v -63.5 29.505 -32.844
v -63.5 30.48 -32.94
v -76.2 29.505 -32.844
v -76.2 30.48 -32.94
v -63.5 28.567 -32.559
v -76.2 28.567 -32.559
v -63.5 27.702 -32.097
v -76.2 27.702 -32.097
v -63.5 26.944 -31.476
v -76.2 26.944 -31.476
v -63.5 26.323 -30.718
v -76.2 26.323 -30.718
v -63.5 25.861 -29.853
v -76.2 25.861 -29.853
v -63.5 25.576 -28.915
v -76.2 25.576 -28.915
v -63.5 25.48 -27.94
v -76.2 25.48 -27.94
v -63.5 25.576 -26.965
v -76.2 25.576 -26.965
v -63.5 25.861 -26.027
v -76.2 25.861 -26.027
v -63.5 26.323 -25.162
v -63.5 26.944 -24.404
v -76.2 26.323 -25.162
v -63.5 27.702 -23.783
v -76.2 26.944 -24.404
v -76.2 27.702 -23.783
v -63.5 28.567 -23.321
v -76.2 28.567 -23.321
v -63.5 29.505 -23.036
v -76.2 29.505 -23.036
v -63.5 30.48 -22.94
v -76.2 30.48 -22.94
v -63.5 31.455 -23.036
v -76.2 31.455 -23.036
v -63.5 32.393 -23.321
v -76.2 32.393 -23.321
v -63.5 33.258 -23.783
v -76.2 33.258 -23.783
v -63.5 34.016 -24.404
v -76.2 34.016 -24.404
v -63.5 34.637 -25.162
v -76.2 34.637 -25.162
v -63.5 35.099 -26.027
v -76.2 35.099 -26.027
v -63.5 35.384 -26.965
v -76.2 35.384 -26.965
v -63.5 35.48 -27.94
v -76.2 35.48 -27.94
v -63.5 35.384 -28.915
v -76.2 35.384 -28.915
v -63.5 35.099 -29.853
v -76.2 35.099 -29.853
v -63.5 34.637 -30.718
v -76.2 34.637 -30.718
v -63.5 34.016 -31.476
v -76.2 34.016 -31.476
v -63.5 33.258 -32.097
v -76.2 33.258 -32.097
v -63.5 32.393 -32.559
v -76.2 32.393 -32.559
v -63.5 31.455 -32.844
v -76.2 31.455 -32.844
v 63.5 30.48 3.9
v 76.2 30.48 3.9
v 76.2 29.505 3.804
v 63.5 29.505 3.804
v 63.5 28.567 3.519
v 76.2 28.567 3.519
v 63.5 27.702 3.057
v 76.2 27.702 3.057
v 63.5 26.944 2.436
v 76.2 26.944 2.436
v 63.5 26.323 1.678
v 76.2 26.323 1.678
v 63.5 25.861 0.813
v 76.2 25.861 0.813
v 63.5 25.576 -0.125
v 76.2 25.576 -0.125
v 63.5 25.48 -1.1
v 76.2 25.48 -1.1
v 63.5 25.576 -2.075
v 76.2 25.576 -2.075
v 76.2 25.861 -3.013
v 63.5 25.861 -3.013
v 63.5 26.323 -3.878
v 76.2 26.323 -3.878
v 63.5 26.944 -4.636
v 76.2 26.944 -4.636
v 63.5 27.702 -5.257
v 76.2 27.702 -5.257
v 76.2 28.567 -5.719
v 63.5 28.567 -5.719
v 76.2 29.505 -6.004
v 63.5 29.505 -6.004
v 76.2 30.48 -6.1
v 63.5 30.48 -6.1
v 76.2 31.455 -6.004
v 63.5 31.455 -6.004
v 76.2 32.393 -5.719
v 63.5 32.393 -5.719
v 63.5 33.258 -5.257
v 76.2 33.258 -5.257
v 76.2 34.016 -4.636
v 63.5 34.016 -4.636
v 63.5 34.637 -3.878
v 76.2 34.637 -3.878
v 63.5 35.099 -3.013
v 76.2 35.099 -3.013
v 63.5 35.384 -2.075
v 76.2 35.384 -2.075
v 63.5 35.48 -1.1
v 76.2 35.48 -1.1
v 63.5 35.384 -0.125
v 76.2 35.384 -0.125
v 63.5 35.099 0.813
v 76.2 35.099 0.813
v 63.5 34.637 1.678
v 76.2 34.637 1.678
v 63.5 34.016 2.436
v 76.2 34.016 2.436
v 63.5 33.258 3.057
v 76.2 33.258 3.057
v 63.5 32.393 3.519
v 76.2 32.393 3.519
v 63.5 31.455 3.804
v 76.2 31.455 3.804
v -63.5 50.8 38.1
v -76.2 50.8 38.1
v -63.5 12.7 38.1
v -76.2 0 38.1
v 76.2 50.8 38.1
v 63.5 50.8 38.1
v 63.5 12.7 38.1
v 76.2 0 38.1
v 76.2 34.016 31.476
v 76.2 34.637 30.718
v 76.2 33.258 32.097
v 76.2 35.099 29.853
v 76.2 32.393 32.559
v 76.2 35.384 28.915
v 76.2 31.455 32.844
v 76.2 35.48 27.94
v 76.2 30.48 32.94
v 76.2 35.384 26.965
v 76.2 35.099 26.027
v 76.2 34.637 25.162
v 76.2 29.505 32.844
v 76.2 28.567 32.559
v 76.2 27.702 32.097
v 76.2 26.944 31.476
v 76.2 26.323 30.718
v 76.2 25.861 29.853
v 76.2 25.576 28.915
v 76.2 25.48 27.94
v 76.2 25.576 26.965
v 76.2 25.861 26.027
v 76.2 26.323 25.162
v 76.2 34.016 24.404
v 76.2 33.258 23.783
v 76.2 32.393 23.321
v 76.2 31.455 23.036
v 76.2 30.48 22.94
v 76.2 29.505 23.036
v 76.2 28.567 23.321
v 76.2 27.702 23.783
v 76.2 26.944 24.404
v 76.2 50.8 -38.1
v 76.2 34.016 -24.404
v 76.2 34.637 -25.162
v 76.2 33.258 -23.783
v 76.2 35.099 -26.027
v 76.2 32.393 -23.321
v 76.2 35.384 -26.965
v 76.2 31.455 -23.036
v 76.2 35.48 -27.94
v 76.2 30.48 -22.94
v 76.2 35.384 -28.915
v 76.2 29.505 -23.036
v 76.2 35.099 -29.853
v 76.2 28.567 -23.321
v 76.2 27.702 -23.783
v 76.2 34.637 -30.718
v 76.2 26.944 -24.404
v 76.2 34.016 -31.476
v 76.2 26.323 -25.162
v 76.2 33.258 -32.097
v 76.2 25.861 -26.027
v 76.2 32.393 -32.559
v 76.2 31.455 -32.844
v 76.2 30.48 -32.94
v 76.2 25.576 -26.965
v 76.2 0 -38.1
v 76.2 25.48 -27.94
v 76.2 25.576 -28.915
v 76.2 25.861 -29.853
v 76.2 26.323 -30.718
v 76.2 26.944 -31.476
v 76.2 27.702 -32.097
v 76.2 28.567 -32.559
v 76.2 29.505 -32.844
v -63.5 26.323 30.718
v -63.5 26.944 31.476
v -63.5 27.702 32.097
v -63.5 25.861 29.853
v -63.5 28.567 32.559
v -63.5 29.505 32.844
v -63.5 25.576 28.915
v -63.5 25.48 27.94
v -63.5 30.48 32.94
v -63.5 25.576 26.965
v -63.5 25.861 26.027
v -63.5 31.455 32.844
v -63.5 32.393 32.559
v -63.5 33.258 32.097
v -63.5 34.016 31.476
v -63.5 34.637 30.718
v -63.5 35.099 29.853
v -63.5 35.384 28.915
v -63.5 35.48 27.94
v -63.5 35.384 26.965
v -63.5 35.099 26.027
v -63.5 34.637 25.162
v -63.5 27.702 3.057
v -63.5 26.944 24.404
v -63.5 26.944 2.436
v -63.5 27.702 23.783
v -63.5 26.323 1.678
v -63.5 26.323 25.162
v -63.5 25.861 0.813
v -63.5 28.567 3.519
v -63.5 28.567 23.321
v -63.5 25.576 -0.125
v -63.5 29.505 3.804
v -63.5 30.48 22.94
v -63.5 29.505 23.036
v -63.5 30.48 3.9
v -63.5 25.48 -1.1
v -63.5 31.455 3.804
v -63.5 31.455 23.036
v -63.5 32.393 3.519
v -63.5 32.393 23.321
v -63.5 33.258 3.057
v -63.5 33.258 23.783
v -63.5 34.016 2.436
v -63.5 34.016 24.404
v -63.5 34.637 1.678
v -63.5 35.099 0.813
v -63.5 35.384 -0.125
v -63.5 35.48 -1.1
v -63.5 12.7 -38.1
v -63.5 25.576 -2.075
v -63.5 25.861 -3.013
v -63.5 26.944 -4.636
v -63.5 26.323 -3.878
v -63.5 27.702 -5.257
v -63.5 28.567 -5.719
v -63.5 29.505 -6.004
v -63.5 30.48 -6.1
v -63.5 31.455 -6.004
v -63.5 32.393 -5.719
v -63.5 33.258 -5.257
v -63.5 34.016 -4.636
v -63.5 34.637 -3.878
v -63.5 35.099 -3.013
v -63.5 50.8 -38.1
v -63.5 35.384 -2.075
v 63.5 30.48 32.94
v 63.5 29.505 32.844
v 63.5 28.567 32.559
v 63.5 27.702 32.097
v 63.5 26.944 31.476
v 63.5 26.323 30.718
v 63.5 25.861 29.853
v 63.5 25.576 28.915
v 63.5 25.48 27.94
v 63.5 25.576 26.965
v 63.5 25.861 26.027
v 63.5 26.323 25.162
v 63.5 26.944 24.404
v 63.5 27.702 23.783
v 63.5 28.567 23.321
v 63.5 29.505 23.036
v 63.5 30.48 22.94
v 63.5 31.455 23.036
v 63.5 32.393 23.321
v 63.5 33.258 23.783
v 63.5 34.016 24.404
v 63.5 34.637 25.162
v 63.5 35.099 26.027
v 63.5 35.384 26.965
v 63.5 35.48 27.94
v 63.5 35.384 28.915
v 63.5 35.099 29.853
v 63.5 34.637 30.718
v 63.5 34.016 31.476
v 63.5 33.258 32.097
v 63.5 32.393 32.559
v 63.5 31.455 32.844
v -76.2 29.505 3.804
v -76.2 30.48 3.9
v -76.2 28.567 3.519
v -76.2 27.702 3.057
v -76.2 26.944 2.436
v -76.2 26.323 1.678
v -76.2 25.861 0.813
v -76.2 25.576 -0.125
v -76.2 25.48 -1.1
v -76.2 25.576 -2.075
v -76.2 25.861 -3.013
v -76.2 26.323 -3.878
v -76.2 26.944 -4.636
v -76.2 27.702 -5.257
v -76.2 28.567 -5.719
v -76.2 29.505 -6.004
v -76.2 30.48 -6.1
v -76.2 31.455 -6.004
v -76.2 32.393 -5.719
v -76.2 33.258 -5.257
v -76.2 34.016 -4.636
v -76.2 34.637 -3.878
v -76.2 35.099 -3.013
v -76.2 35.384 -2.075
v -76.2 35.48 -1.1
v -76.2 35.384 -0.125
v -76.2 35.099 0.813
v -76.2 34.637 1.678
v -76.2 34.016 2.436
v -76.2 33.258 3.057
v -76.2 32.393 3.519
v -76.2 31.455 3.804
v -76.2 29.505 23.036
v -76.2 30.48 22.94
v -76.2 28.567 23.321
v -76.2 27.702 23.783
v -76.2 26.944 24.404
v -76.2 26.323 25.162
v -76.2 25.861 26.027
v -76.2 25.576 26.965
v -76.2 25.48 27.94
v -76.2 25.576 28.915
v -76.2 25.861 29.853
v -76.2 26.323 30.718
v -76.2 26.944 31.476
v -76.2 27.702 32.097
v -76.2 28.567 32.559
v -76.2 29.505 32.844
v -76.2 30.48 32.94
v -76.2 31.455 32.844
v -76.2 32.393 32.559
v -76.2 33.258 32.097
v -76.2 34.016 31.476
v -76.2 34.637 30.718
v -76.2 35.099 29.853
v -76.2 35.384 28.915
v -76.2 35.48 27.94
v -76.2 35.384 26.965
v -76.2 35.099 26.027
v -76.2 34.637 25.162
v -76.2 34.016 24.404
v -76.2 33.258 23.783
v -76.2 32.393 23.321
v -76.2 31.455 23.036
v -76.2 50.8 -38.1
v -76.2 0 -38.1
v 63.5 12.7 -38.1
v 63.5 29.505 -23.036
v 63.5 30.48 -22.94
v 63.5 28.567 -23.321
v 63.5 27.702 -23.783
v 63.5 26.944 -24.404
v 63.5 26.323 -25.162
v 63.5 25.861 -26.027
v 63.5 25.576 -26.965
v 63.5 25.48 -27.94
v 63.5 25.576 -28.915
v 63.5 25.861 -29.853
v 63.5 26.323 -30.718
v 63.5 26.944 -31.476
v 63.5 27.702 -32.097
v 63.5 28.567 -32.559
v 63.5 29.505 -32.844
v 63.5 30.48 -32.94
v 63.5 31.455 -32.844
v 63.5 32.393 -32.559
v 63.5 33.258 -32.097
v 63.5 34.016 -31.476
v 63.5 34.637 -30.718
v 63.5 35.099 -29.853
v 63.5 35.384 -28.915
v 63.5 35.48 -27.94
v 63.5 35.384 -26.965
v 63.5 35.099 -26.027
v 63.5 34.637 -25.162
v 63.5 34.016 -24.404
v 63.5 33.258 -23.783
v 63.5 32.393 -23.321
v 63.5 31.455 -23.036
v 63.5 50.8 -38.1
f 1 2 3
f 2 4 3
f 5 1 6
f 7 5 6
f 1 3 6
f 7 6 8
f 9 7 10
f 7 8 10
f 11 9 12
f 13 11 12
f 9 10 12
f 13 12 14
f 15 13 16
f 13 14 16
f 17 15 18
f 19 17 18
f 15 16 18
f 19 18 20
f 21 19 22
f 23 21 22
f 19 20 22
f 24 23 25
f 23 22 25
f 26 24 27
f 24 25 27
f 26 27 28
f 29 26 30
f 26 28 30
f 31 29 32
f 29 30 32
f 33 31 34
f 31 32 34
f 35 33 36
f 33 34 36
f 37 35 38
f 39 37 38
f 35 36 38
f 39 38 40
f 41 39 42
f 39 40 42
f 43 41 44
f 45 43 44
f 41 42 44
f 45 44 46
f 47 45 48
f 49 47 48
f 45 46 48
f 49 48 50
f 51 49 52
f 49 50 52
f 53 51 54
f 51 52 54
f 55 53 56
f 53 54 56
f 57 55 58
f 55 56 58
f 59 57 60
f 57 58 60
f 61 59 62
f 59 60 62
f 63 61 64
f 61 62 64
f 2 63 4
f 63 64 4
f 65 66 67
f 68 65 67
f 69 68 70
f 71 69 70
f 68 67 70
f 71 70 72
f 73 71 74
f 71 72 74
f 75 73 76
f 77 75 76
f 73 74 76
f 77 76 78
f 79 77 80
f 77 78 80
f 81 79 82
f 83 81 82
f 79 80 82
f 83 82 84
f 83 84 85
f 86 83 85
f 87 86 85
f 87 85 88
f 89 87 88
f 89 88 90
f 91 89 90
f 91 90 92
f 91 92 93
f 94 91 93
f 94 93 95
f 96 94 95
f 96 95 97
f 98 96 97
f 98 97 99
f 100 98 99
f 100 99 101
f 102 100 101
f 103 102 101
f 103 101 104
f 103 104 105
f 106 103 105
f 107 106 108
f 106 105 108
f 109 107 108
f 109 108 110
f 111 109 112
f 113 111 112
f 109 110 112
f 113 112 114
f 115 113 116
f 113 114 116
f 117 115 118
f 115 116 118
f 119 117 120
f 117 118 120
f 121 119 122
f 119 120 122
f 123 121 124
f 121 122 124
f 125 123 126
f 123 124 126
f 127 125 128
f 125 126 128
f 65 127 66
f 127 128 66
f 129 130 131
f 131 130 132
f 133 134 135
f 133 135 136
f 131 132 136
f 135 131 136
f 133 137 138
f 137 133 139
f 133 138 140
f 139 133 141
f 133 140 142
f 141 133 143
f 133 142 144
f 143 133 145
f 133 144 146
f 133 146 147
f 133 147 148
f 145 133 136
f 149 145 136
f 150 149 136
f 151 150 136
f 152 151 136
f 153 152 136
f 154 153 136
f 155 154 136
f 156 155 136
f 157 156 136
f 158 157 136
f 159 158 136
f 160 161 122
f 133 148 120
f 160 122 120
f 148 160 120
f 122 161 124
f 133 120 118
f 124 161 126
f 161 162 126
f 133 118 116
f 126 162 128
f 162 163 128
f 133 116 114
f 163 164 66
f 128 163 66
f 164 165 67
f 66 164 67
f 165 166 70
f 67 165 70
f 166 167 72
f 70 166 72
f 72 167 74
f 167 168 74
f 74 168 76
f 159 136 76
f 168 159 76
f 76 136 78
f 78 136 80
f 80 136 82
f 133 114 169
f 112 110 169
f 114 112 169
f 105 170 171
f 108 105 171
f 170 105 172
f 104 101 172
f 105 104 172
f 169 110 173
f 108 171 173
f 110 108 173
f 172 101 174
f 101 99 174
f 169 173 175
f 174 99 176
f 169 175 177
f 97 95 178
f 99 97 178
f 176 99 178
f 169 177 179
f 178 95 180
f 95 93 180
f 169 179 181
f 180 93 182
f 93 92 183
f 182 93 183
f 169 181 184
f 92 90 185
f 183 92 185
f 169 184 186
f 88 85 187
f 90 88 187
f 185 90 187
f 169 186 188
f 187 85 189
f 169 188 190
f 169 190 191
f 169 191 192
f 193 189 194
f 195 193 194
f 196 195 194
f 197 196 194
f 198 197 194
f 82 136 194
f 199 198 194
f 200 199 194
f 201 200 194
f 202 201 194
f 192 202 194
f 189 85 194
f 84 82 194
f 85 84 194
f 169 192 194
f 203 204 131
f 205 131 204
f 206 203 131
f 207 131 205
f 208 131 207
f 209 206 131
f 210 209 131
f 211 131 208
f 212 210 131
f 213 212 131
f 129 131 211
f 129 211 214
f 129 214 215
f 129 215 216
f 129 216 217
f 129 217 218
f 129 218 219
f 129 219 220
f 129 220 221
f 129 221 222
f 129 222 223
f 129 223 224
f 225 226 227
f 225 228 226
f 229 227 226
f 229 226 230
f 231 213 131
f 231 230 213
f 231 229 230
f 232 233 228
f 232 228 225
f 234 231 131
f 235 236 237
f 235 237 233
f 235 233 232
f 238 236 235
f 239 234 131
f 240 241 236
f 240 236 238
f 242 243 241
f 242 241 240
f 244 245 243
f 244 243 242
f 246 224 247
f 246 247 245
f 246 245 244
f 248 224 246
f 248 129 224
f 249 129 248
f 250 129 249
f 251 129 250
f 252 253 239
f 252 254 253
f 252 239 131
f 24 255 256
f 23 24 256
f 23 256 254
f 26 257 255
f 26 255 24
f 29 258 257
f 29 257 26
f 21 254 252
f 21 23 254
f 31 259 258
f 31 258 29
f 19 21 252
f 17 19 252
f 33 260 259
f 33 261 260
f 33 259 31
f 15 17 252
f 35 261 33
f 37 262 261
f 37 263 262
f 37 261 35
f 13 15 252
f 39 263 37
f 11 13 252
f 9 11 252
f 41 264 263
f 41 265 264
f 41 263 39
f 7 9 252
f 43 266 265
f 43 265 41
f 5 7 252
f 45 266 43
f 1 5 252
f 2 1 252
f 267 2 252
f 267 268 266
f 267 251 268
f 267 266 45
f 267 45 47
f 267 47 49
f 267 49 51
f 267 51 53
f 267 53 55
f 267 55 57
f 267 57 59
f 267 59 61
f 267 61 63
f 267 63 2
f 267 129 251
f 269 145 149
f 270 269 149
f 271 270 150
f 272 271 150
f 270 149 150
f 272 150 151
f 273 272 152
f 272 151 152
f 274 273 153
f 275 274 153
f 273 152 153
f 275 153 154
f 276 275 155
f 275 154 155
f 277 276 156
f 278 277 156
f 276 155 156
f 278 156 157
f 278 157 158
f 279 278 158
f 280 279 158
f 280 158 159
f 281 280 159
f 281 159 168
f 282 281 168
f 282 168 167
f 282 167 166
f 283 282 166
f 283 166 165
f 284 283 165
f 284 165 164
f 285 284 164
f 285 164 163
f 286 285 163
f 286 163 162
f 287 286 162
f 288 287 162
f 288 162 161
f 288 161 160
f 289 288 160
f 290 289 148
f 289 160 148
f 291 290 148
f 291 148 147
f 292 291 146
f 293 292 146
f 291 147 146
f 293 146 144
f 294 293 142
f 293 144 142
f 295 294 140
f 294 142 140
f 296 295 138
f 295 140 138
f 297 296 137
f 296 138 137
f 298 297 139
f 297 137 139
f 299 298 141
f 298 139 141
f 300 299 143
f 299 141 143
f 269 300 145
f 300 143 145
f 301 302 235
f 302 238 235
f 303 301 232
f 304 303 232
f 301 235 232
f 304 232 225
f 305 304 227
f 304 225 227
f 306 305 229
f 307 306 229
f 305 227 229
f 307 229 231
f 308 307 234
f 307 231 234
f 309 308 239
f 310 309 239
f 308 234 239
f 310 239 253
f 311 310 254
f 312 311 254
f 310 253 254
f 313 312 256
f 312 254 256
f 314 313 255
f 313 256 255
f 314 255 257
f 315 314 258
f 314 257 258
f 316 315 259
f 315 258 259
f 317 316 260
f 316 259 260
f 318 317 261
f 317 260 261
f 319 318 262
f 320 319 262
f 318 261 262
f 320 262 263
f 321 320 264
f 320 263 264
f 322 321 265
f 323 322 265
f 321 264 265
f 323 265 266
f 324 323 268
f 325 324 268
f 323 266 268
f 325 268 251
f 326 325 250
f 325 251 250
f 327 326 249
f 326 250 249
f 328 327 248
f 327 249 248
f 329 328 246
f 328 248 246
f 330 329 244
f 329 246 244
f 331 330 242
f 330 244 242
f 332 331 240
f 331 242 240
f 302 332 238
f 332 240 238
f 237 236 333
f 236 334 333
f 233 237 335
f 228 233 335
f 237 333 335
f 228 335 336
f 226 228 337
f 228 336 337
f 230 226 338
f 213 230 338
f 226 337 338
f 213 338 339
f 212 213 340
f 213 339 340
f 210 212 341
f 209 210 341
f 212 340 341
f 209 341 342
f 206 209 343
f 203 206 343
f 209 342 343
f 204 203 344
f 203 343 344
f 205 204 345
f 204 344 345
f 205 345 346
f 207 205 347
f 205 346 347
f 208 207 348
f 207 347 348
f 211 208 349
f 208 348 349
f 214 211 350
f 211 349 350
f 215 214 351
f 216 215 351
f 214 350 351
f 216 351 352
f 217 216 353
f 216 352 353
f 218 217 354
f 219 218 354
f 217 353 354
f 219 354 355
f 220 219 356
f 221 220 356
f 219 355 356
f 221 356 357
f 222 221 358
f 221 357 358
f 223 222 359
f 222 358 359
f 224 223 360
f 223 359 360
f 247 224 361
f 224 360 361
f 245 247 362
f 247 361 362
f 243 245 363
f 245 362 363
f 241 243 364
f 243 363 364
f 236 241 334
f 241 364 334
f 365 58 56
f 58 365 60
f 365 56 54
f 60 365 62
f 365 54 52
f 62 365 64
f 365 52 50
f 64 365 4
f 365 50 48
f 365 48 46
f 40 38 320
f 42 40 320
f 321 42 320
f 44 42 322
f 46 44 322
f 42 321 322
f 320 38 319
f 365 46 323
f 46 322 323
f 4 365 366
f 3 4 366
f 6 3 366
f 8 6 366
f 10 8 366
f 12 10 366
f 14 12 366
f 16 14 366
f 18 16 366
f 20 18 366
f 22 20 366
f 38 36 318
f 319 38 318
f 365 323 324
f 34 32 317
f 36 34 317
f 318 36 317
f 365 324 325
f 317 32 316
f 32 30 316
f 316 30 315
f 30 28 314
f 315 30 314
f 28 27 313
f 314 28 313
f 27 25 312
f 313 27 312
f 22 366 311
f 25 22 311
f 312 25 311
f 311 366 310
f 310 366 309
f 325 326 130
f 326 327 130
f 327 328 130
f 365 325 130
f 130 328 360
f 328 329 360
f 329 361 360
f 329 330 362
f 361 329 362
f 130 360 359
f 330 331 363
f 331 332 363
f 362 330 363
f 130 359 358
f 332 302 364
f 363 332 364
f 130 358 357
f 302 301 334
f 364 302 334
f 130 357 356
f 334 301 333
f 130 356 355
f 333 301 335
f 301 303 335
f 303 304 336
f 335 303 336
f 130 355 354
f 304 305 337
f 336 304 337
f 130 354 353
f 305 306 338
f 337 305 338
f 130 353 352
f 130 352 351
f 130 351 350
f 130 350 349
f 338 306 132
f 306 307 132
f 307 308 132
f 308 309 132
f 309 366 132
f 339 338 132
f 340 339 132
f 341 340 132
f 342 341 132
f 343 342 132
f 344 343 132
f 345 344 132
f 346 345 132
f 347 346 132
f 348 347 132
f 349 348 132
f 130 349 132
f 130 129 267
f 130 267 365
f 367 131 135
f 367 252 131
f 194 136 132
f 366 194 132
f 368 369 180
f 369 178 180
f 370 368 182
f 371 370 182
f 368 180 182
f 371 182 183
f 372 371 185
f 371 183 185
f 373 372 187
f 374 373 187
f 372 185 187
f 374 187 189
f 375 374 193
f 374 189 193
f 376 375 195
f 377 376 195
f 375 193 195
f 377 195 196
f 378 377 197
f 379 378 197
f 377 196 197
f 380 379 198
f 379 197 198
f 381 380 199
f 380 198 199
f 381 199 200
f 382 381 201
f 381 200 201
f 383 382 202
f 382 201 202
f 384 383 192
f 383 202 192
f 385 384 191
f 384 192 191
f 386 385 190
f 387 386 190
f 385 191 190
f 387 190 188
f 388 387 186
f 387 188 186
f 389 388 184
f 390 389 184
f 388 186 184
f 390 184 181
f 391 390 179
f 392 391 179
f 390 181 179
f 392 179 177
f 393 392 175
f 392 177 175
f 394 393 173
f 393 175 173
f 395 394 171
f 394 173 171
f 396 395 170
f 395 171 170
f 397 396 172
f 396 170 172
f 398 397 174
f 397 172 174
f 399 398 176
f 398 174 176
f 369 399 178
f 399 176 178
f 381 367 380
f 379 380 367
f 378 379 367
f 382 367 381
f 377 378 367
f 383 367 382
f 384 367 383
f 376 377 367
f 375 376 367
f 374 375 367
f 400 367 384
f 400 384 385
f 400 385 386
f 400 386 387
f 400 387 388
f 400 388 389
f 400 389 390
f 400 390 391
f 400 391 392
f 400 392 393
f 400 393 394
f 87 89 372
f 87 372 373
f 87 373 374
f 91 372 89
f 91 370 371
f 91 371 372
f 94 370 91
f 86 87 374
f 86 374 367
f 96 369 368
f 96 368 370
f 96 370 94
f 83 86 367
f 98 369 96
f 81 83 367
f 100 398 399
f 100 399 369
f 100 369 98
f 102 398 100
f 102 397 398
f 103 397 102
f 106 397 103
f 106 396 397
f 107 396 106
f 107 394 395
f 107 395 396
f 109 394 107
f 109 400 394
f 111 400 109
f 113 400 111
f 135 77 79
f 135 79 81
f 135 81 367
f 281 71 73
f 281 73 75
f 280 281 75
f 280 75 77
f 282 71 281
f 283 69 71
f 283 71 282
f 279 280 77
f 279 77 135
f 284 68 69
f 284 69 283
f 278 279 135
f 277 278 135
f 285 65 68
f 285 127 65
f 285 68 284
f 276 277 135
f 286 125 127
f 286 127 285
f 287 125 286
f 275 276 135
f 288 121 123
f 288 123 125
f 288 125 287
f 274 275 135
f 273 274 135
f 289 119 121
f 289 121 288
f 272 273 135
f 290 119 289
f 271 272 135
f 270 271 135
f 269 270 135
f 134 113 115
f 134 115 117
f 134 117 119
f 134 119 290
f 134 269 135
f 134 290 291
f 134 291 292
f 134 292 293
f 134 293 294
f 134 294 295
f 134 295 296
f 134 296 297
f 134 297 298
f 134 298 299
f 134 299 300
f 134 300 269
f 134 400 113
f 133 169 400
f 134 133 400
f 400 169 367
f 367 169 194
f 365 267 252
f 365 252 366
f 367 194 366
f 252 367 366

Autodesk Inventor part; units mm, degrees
ref_plane "YZ Plane" through (0, 0, 0) normal (1, 0, 0) x (0, 1, 0)
ref_plane "XZ Plane" through (0, 0, 0) normal (0, 1, 0) x (-1, 0, 0)
ref_plane "XY Plane" through (0, 0, 0) normal (0, 0, 1) x (1, 0, 0)
sketch "Sketch2" plane through (0, 0, 0) normal (0, 1, 0) x (-1, 0, 0)
  line L0 (-76.2, -38.1) -> (76.2, -38.1)
  line L1 (76.2, -38.1) -> (76.2, 38.1)
  line L2 (76.2, 38.1) -> (-76.2, 38.1)
  line L3 (-76.2, 38.1) -> (-76.2, -38.1)
  line L4 (-76.2, -38.1) -> (76.2, 38.1) construction
  line L5 (76.2, -38.1) -> (-76.2, 38.1) construction
  point P0 (0, 0)
  dimension "d0" = 152.4
  dimension "d1" = 76.2
extrude "Extrusion1" add sketch "Sketch2" along normal blind 50.8
sketch "Sketch3" plane through (0, 50.8, 0) normal (0, 1, 0) x (1, 0, 0)
  line L0 (63.5, -38.1) -> (-63.5, -38.1)
  line L1 (-63.5, -38.1) -> (-63.5, 38.1)
  line L2 (-63.5, 38.1) -> (63.5, 38.1)
  line L3 (63.5, 38.1) -> (63.5, -38.1)
  line L4 (63.5, -38.1) -> (-63.5, 38.1) construction
  line L5 (-63.5, -38.1) -> (63.5, 38.1) construction
  point P0 (0, 0)
  dimension "d4" = 127
  dimension "d5" = 76.2
extrude "Extrusion2" cut sketch "Sketch3" against normal blind 38.1
sketch "Sketch4" plane through (63.5, 50.8, -38.1) normal (-1, 0, 0) x (0, 0, 1)
  line L0 (0, 0) -> (76.2, 0) projected
  line L1 (0, -38.1) -> (0, 0) projected
  point P0 (38.1, -50.8)
  point P1 (10.16, -20.32)
  dimension "d8" = 20.32
  dimension "d9" = 10.16
hole "Hole1" at (63.5, 30.48, -27.94) direction (1, 0, 0) diameter 10 end through all
sketch "Sketch5" plane through (63.5, 50.8, -38.1) normal (-1, 0, 0) x (0, 0, 1)
  line L0 (0, 0) -> (76.2, 0) projected
  line L1 (76.2, 0) -> (76.2, -38.1) projected
  point P0 (38.1, -50.8)
  point P1 (66.04, -20.32)
  dimension "d17" = 20.32
  dimension "d18" = 10.16
hole "Hole2" at (63.5, 30.48, 27.94) direction (1, 0, 0) diameter 10 end through all
sketch "Sketch6" plane through (-63.5, 50.8, 38.1) normal (1, 0, 0) x (0, 0, -1)
  line L0 (0, 0) -> (76.2, 0) projected
  line L1 (0, -38.1) -> (0, 0) projected
  line L2 (76.2, 0) -> (76.2, -38.1) projected
  point P0 (38.1, -50.8)
  point P1 (10.16, -20.32)
  point P2 (66.04, -20.32)
  dimension "d26" = 20.32
  dimension "d27" = 10.16
  dimension "d28" = 20.32
  dimension "d29" = 10.16
hole "Hole3" at (-63.5, 30.48, 27.94) at (-63.5, 30.48, -27.94) direction (-1, 0, 0) diameter 10 end through all
sketch "Sketch7" plane through (63.5, 50.8, -38.1) normal (-1, 0, 0) x (0, 0, 1)
  line L0 (0, 0) -> (76.2, 0) projected
  line L1 (0, -38.1) -> (0, 0) projected
  point P0 (38.1, -50.8)
  point P1 (37, -20.32)
  dimension "d37" = 20.32
  dimension "d38" = 37
hole "Hole4" at (63.5, 30.48, -1.1) direction (1, 0, 0) diameter 10 end through all
sketch "Sketch8" plane through (-76.2, 0, -38.1) normal (-1, 0, 0) x (0, 0, 1)
  line L0 (0, 50.8) -> (76.2, 50.8) projected
  line L1 (0, 0) -> (0, 50.8) projected
  point P0 (38.1, 0)
  point P1 (37, 30.48)
  dimension "d46" = 20.32
  dimension "d47" = 37
hole "Hole5" at (-76.2, 30.48, -1.1) direction (1, 0, 0) diameter 10 end through all
